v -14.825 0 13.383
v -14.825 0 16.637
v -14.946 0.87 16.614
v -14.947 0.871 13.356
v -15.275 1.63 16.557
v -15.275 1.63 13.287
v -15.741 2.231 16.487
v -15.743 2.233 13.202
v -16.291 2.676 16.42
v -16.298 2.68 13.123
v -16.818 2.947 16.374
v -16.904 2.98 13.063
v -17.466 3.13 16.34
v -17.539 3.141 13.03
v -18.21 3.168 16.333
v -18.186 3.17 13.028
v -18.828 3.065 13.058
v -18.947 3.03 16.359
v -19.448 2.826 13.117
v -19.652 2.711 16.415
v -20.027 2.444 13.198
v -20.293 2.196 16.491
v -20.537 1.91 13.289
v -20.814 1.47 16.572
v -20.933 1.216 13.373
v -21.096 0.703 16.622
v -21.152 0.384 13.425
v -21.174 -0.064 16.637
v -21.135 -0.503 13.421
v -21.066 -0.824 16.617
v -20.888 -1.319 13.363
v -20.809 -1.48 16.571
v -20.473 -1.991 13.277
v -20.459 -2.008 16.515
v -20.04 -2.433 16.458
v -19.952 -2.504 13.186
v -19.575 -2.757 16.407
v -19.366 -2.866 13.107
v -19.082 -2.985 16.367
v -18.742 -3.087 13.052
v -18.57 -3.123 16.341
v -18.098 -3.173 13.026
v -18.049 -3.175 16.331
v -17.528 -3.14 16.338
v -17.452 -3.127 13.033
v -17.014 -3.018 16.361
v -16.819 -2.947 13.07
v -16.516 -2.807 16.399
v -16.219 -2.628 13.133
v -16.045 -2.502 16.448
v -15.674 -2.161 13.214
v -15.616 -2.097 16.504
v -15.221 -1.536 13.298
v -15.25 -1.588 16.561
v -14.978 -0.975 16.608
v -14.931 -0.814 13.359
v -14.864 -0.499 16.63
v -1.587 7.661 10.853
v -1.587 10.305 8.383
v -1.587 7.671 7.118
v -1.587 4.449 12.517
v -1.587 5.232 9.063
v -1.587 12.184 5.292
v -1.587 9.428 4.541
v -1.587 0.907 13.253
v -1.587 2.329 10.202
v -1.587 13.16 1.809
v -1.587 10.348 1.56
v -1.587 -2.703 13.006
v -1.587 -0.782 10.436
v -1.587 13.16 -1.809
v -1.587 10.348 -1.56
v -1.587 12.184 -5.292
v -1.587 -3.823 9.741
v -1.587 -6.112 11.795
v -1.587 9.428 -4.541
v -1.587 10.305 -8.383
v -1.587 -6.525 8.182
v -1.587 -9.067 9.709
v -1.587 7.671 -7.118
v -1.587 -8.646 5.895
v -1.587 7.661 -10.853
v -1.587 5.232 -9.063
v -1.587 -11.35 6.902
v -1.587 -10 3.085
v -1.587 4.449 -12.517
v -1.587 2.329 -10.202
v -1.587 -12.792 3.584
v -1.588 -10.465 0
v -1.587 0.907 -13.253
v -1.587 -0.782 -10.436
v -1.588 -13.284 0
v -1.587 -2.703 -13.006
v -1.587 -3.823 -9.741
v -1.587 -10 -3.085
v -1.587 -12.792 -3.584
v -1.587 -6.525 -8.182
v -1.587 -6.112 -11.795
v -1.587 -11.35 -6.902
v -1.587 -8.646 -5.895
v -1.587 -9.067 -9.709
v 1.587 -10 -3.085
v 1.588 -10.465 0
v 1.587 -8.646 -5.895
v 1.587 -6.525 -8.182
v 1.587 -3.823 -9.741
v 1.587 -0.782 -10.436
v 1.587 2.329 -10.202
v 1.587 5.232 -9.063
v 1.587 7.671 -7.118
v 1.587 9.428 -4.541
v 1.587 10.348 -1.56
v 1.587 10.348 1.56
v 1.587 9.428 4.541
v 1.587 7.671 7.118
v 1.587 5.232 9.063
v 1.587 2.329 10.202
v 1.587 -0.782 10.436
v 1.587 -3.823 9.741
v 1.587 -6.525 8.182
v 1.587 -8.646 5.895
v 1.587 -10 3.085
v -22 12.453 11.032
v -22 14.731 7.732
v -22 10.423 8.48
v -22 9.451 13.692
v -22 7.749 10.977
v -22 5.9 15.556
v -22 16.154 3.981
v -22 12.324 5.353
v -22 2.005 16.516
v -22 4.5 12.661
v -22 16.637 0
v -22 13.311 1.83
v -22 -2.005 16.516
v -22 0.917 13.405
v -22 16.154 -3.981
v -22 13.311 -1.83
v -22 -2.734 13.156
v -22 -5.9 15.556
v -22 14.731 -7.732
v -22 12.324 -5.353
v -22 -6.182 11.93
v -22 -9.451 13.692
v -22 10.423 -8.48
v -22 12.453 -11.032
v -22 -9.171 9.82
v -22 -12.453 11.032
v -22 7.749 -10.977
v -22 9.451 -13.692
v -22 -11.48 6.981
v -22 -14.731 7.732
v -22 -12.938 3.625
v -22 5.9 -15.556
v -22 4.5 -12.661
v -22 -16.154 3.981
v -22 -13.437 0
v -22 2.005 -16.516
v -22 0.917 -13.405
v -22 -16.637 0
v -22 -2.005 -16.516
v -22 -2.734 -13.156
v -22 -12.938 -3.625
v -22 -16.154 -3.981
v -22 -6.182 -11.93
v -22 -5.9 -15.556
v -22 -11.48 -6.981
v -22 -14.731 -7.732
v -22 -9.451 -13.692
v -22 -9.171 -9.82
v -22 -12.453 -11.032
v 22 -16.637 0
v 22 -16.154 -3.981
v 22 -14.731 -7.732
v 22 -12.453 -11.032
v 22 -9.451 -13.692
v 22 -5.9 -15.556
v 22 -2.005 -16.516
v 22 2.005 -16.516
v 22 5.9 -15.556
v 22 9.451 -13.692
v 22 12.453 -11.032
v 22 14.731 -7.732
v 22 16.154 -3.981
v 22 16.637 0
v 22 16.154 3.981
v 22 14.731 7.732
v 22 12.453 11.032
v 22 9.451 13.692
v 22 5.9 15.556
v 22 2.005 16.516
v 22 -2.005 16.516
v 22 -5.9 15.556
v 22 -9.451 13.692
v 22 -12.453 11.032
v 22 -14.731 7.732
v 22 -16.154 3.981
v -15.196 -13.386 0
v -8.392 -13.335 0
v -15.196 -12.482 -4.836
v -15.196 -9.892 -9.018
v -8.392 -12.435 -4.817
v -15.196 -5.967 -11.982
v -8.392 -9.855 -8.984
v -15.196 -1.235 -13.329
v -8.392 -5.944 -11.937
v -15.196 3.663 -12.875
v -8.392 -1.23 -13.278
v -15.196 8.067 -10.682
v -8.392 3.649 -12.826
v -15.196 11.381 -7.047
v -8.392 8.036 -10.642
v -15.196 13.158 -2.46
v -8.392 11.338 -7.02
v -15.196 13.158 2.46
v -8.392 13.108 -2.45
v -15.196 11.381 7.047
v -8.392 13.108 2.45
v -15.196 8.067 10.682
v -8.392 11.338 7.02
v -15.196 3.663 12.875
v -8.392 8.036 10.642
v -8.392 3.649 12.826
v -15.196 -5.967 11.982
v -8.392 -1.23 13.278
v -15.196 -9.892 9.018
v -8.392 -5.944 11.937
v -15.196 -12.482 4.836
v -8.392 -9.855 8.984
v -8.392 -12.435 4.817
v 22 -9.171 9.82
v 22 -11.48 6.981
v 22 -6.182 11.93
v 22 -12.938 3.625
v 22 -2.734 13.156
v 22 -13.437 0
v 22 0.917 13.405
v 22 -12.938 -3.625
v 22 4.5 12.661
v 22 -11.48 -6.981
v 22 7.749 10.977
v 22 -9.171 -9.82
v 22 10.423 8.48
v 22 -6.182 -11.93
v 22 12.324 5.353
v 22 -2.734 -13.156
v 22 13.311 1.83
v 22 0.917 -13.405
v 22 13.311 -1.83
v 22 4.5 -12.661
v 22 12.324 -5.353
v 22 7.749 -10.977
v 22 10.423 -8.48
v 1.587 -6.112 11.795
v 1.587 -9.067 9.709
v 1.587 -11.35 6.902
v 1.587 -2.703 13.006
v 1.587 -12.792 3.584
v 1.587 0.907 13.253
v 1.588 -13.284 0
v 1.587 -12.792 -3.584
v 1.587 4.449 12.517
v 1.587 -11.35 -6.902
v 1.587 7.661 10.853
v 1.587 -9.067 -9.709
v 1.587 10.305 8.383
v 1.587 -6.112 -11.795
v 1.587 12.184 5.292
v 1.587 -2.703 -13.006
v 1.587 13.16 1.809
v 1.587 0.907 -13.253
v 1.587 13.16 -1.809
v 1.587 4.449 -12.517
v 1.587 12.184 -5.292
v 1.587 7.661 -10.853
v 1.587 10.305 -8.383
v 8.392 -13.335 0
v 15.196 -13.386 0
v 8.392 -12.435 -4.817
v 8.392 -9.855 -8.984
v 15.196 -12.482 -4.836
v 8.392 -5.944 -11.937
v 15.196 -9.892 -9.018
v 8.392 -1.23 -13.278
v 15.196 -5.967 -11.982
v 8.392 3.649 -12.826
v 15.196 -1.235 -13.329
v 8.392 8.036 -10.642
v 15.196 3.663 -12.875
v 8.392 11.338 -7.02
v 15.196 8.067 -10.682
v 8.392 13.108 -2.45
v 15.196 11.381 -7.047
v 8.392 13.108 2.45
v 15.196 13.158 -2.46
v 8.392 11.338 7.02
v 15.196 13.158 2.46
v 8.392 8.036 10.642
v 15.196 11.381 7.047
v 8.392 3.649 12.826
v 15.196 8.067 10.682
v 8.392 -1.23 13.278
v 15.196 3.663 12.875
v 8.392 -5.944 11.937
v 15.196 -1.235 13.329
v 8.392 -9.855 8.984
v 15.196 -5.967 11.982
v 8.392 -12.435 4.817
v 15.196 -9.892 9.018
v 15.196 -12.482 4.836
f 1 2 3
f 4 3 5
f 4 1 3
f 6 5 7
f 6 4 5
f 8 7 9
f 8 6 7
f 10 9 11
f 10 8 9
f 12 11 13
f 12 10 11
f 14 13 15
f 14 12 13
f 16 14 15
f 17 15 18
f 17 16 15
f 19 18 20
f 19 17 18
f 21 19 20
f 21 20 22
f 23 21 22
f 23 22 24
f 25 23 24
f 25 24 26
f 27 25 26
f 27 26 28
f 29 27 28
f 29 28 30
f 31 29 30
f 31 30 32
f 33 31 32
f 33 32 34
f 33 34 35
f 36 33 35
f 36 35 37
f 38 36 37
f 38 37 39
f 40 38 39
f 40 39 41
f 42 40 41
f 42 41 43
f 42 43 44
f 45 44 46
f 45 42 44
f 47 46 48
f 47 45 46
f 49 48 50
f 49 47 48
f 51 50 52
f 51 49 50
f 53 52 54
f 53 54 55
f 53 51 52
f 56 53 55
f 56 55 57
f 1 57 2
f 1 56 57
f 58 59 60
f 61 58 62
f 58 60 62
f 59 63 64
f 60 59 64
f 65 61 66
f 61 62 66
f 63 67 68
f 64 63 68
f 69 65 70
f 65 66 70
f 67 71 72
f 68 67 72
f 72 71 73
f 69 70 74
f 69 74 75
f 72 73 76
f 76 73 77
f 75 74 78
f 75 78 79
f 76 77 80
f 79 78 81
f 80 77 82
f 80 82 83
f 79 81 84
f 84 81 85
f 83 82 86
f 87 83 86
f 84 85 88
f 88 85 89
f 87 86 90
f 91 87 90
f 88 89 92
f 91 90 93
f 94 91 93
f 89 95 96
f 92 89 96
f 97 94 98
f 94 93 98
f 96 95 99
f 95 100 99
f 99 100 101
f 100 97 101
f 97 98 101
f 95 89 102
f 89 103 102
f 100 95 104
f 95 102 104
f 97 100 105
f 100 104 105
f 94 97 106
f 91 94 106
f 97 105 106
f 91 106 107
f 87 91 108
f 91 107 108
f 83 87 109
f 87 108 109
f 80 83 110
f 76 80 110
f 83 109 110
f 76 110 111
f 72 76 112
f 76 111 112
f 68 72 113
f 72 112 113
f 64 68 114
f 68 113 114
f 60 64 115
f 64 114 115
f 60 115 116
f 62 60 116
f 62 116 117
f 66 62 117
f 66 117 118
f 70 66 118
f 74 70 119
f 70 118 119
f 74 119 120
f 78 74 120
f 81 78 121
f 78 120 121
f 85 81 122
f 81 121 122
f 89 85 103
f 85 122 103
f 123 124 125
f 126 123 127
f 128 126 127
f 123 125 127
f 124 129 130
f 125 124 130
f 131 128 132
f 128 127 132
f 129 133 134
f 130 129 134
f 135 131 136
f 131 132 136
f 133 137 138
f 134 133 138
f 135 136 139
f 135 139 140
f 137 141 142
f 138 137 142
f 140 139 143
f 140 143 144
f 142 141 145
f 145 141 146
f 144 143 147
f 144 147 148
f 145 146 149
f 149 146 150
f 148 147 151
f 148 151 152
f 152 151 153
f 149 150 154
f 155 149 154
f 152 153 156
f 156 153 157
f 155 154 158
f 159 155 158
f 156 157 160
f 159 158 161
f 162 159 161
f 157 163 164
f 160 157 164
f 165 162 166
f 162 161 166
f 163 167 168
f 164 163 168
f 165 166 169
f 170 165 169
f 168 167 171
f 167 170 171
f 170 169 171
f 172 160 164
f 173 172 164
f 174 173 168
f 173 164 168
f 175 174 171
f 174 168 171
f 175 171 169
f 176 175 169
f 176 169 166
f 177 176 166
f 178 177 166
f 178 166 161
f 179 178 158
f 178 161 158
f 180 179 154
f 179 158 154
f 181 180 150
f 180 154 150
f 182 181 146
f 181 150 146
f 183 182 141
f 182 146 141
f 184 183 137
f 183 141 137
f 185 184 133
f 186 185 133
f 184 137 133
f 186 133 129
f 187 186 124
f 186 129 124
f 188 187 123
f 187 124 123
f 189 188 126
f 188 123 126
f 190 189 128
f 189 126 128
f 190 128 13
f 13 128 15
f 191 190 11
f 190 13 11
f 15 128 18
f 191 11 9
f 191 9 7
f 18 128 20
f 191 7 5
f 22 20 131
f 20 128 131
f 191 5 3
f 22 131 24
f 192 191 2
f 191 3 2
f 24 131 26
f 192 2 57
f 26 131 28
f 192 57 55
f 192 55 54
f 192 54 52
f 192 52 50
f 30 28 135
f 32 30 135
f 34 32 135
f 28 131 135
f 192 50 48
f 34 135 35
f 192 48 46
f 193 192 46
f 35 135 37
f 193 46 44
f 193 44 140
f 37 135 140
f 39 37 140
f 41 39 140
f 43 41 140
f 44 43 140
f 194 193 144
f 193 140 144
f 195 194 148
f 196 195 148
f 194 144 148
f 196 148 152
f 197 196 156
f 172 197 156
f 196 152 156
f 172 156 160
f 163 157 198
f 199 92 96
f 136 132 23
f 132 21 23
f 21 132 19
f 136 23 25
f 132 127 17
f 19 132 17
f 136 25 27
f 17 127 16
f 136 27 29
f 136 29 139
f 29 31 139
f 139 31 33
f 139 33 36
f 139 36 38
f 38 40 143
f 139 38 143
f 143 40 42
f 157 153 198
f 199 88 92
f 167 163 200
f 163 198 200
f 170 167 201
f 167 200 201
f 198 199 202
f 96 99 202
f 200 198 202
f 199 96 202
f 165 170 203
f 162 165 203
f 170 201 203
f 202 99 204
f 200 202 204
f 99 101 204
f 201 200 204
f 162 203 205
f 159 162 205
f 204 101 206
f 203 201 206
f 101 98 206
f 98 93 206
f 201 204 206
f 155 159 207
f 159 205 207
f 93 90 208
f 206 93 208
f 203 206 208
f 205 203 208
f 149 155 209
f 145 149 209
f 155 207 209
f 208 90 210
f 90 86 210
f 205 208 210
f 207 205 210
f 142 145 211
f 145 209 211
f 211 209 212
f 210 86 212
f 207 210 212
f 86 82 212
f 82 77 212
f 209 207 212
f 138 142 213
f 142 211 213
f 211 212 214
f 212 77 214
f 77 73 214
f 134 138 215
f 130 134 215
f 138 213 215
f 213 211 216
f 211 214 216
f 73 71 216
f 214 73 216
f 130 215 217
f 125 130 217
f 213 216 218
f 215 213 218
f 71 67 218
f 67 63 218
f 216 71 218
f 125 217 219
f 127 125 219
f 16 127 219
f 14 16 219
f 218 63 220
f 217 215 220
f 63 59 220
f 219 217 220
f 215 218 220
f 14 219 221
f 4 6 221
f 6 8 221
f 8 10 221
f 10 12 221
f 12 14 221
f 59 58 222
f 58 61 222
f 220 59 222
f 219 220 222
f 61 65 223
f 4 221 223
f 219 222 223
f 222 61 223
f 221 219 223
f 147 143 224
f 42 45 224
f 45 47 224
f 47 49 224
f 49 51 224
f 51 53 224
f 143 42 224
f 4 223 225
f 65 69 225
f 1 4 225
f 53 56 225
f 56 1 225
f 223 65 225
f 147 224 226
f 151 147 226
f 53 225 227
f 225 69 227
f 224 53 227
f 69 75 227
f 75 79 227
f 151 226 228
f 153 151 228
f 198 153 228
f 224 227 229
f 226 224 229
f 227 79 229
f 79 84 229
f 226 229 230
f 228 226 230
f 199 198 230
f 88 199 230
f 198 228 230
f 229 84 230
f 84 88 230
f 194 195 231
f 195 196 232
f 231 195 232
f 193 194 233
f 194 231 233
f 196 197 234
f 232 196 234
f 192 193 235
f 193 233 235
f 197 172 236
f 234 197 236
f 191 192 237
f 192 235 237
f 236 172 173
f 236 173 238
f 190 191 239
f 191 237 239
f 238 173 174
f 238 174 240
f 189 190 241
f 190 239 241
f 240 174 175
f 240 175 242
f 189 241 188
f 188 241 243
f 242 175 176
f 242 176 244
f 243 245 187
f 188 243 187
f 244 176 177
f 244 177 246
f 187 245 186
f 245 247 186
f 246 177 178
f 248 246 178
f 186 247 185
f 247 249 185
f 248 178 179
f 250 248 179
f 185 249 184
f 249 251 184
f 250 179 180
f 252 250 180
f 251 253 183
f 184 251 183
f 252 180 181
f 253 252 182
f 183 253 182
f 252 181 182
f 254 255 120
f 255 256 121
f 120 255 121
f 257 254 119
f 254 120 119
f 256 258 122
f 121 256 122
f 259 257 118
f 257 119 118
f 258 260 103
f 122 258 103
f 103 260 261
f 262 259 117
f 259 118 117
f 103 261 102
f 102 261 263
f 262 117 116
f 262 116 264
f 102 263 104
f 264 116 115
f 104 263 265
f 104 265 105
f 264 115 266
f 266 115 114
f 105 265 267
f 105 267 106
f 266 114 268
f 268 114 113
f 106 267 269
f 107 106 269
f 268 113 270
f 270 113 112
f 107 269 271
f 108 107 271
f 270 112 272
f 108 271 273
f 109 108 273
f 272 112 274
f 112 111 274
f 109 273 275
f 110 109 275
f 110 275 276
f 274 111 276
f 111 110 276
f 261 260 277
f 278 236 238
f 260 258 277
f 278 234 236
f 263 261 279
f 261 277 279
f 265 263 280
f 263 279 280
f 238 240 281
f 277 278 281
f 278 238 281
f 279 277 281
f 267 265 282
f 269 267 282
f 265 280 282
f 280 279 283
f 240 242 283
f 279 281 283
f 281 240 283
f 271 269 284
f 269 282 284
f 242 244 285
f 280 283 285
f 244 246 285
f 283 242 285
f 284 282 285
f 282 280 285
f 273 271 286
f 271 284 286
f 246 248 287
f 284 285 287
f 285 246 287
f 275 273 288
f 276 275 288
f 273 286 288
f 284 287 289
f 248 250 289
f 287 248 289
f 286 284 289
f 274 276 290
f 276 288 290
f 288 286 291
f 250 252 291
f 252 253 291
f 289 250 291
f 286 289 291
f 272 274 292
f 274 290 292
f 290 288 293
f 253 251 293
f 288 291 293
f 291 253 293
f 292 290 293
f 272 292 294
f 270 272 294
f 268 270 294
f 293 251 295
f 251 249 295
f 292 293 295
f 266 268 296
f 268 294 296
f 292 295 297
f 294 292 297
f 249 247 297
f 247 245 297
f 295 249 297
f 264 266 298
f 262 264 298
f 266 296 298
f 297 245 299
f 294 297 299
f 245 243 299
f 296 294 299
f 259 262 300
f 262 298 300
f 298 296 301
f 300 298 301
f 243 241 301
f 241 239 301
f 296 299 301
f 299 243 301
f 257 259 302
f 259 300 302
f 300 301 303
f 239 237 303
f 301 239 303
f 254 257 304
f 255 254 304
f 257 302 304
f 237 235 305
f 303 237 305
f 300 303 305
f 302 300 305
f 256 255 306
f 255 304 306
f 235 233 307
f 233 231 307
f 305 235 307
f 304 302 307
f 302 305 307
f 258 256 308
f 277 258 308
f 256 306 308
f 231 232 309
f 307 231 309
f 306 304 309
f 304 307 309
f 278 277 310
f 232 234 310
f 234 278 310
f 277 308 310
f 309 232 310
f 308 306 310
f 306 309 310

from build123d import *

# Parameters (mm, degrees)
CUT_EXTRUDE1_REACH = 18.637
SKETCH2_R          = 3.175


with BuildPart() as part:
    # Sketch1 → Revolve1 (revolve)
    with BuildSketch(Plane.XY):
        Polygon((-1.5875, -10.4648), (1.5875, -10.4648), (1.5875, -13.2842), (22, -13.4366), (22, -16.637), (-22, -16.637), (-22, -13.4366), (-1.5875, -13.2842), align=None)
    revolve(axis=Axis((-22, 0, 0), (1, 0, 0)))

    # Sketch2 → Cut-Extrude1 (cut, up to next)
    with BuildSketch(Plane.XY, mode=Mode.PRIVATE) as cut_extrude1_sk1:
        with Locations((-18, 0)):
            Circle(SKETCH2_R)
    cut_extrude1_tool1 = extrude(cut_extrude1_sk1.sketch, amount=CUT_EXTRUDE1_REACH, mode=Mode.PRIVATE) & part.part
    add(cut_extrude1_tool1.solids().sort_by_distance((-18, 0, 0))[0], mode=Mode.SUBTRACT)


solid = part.part
